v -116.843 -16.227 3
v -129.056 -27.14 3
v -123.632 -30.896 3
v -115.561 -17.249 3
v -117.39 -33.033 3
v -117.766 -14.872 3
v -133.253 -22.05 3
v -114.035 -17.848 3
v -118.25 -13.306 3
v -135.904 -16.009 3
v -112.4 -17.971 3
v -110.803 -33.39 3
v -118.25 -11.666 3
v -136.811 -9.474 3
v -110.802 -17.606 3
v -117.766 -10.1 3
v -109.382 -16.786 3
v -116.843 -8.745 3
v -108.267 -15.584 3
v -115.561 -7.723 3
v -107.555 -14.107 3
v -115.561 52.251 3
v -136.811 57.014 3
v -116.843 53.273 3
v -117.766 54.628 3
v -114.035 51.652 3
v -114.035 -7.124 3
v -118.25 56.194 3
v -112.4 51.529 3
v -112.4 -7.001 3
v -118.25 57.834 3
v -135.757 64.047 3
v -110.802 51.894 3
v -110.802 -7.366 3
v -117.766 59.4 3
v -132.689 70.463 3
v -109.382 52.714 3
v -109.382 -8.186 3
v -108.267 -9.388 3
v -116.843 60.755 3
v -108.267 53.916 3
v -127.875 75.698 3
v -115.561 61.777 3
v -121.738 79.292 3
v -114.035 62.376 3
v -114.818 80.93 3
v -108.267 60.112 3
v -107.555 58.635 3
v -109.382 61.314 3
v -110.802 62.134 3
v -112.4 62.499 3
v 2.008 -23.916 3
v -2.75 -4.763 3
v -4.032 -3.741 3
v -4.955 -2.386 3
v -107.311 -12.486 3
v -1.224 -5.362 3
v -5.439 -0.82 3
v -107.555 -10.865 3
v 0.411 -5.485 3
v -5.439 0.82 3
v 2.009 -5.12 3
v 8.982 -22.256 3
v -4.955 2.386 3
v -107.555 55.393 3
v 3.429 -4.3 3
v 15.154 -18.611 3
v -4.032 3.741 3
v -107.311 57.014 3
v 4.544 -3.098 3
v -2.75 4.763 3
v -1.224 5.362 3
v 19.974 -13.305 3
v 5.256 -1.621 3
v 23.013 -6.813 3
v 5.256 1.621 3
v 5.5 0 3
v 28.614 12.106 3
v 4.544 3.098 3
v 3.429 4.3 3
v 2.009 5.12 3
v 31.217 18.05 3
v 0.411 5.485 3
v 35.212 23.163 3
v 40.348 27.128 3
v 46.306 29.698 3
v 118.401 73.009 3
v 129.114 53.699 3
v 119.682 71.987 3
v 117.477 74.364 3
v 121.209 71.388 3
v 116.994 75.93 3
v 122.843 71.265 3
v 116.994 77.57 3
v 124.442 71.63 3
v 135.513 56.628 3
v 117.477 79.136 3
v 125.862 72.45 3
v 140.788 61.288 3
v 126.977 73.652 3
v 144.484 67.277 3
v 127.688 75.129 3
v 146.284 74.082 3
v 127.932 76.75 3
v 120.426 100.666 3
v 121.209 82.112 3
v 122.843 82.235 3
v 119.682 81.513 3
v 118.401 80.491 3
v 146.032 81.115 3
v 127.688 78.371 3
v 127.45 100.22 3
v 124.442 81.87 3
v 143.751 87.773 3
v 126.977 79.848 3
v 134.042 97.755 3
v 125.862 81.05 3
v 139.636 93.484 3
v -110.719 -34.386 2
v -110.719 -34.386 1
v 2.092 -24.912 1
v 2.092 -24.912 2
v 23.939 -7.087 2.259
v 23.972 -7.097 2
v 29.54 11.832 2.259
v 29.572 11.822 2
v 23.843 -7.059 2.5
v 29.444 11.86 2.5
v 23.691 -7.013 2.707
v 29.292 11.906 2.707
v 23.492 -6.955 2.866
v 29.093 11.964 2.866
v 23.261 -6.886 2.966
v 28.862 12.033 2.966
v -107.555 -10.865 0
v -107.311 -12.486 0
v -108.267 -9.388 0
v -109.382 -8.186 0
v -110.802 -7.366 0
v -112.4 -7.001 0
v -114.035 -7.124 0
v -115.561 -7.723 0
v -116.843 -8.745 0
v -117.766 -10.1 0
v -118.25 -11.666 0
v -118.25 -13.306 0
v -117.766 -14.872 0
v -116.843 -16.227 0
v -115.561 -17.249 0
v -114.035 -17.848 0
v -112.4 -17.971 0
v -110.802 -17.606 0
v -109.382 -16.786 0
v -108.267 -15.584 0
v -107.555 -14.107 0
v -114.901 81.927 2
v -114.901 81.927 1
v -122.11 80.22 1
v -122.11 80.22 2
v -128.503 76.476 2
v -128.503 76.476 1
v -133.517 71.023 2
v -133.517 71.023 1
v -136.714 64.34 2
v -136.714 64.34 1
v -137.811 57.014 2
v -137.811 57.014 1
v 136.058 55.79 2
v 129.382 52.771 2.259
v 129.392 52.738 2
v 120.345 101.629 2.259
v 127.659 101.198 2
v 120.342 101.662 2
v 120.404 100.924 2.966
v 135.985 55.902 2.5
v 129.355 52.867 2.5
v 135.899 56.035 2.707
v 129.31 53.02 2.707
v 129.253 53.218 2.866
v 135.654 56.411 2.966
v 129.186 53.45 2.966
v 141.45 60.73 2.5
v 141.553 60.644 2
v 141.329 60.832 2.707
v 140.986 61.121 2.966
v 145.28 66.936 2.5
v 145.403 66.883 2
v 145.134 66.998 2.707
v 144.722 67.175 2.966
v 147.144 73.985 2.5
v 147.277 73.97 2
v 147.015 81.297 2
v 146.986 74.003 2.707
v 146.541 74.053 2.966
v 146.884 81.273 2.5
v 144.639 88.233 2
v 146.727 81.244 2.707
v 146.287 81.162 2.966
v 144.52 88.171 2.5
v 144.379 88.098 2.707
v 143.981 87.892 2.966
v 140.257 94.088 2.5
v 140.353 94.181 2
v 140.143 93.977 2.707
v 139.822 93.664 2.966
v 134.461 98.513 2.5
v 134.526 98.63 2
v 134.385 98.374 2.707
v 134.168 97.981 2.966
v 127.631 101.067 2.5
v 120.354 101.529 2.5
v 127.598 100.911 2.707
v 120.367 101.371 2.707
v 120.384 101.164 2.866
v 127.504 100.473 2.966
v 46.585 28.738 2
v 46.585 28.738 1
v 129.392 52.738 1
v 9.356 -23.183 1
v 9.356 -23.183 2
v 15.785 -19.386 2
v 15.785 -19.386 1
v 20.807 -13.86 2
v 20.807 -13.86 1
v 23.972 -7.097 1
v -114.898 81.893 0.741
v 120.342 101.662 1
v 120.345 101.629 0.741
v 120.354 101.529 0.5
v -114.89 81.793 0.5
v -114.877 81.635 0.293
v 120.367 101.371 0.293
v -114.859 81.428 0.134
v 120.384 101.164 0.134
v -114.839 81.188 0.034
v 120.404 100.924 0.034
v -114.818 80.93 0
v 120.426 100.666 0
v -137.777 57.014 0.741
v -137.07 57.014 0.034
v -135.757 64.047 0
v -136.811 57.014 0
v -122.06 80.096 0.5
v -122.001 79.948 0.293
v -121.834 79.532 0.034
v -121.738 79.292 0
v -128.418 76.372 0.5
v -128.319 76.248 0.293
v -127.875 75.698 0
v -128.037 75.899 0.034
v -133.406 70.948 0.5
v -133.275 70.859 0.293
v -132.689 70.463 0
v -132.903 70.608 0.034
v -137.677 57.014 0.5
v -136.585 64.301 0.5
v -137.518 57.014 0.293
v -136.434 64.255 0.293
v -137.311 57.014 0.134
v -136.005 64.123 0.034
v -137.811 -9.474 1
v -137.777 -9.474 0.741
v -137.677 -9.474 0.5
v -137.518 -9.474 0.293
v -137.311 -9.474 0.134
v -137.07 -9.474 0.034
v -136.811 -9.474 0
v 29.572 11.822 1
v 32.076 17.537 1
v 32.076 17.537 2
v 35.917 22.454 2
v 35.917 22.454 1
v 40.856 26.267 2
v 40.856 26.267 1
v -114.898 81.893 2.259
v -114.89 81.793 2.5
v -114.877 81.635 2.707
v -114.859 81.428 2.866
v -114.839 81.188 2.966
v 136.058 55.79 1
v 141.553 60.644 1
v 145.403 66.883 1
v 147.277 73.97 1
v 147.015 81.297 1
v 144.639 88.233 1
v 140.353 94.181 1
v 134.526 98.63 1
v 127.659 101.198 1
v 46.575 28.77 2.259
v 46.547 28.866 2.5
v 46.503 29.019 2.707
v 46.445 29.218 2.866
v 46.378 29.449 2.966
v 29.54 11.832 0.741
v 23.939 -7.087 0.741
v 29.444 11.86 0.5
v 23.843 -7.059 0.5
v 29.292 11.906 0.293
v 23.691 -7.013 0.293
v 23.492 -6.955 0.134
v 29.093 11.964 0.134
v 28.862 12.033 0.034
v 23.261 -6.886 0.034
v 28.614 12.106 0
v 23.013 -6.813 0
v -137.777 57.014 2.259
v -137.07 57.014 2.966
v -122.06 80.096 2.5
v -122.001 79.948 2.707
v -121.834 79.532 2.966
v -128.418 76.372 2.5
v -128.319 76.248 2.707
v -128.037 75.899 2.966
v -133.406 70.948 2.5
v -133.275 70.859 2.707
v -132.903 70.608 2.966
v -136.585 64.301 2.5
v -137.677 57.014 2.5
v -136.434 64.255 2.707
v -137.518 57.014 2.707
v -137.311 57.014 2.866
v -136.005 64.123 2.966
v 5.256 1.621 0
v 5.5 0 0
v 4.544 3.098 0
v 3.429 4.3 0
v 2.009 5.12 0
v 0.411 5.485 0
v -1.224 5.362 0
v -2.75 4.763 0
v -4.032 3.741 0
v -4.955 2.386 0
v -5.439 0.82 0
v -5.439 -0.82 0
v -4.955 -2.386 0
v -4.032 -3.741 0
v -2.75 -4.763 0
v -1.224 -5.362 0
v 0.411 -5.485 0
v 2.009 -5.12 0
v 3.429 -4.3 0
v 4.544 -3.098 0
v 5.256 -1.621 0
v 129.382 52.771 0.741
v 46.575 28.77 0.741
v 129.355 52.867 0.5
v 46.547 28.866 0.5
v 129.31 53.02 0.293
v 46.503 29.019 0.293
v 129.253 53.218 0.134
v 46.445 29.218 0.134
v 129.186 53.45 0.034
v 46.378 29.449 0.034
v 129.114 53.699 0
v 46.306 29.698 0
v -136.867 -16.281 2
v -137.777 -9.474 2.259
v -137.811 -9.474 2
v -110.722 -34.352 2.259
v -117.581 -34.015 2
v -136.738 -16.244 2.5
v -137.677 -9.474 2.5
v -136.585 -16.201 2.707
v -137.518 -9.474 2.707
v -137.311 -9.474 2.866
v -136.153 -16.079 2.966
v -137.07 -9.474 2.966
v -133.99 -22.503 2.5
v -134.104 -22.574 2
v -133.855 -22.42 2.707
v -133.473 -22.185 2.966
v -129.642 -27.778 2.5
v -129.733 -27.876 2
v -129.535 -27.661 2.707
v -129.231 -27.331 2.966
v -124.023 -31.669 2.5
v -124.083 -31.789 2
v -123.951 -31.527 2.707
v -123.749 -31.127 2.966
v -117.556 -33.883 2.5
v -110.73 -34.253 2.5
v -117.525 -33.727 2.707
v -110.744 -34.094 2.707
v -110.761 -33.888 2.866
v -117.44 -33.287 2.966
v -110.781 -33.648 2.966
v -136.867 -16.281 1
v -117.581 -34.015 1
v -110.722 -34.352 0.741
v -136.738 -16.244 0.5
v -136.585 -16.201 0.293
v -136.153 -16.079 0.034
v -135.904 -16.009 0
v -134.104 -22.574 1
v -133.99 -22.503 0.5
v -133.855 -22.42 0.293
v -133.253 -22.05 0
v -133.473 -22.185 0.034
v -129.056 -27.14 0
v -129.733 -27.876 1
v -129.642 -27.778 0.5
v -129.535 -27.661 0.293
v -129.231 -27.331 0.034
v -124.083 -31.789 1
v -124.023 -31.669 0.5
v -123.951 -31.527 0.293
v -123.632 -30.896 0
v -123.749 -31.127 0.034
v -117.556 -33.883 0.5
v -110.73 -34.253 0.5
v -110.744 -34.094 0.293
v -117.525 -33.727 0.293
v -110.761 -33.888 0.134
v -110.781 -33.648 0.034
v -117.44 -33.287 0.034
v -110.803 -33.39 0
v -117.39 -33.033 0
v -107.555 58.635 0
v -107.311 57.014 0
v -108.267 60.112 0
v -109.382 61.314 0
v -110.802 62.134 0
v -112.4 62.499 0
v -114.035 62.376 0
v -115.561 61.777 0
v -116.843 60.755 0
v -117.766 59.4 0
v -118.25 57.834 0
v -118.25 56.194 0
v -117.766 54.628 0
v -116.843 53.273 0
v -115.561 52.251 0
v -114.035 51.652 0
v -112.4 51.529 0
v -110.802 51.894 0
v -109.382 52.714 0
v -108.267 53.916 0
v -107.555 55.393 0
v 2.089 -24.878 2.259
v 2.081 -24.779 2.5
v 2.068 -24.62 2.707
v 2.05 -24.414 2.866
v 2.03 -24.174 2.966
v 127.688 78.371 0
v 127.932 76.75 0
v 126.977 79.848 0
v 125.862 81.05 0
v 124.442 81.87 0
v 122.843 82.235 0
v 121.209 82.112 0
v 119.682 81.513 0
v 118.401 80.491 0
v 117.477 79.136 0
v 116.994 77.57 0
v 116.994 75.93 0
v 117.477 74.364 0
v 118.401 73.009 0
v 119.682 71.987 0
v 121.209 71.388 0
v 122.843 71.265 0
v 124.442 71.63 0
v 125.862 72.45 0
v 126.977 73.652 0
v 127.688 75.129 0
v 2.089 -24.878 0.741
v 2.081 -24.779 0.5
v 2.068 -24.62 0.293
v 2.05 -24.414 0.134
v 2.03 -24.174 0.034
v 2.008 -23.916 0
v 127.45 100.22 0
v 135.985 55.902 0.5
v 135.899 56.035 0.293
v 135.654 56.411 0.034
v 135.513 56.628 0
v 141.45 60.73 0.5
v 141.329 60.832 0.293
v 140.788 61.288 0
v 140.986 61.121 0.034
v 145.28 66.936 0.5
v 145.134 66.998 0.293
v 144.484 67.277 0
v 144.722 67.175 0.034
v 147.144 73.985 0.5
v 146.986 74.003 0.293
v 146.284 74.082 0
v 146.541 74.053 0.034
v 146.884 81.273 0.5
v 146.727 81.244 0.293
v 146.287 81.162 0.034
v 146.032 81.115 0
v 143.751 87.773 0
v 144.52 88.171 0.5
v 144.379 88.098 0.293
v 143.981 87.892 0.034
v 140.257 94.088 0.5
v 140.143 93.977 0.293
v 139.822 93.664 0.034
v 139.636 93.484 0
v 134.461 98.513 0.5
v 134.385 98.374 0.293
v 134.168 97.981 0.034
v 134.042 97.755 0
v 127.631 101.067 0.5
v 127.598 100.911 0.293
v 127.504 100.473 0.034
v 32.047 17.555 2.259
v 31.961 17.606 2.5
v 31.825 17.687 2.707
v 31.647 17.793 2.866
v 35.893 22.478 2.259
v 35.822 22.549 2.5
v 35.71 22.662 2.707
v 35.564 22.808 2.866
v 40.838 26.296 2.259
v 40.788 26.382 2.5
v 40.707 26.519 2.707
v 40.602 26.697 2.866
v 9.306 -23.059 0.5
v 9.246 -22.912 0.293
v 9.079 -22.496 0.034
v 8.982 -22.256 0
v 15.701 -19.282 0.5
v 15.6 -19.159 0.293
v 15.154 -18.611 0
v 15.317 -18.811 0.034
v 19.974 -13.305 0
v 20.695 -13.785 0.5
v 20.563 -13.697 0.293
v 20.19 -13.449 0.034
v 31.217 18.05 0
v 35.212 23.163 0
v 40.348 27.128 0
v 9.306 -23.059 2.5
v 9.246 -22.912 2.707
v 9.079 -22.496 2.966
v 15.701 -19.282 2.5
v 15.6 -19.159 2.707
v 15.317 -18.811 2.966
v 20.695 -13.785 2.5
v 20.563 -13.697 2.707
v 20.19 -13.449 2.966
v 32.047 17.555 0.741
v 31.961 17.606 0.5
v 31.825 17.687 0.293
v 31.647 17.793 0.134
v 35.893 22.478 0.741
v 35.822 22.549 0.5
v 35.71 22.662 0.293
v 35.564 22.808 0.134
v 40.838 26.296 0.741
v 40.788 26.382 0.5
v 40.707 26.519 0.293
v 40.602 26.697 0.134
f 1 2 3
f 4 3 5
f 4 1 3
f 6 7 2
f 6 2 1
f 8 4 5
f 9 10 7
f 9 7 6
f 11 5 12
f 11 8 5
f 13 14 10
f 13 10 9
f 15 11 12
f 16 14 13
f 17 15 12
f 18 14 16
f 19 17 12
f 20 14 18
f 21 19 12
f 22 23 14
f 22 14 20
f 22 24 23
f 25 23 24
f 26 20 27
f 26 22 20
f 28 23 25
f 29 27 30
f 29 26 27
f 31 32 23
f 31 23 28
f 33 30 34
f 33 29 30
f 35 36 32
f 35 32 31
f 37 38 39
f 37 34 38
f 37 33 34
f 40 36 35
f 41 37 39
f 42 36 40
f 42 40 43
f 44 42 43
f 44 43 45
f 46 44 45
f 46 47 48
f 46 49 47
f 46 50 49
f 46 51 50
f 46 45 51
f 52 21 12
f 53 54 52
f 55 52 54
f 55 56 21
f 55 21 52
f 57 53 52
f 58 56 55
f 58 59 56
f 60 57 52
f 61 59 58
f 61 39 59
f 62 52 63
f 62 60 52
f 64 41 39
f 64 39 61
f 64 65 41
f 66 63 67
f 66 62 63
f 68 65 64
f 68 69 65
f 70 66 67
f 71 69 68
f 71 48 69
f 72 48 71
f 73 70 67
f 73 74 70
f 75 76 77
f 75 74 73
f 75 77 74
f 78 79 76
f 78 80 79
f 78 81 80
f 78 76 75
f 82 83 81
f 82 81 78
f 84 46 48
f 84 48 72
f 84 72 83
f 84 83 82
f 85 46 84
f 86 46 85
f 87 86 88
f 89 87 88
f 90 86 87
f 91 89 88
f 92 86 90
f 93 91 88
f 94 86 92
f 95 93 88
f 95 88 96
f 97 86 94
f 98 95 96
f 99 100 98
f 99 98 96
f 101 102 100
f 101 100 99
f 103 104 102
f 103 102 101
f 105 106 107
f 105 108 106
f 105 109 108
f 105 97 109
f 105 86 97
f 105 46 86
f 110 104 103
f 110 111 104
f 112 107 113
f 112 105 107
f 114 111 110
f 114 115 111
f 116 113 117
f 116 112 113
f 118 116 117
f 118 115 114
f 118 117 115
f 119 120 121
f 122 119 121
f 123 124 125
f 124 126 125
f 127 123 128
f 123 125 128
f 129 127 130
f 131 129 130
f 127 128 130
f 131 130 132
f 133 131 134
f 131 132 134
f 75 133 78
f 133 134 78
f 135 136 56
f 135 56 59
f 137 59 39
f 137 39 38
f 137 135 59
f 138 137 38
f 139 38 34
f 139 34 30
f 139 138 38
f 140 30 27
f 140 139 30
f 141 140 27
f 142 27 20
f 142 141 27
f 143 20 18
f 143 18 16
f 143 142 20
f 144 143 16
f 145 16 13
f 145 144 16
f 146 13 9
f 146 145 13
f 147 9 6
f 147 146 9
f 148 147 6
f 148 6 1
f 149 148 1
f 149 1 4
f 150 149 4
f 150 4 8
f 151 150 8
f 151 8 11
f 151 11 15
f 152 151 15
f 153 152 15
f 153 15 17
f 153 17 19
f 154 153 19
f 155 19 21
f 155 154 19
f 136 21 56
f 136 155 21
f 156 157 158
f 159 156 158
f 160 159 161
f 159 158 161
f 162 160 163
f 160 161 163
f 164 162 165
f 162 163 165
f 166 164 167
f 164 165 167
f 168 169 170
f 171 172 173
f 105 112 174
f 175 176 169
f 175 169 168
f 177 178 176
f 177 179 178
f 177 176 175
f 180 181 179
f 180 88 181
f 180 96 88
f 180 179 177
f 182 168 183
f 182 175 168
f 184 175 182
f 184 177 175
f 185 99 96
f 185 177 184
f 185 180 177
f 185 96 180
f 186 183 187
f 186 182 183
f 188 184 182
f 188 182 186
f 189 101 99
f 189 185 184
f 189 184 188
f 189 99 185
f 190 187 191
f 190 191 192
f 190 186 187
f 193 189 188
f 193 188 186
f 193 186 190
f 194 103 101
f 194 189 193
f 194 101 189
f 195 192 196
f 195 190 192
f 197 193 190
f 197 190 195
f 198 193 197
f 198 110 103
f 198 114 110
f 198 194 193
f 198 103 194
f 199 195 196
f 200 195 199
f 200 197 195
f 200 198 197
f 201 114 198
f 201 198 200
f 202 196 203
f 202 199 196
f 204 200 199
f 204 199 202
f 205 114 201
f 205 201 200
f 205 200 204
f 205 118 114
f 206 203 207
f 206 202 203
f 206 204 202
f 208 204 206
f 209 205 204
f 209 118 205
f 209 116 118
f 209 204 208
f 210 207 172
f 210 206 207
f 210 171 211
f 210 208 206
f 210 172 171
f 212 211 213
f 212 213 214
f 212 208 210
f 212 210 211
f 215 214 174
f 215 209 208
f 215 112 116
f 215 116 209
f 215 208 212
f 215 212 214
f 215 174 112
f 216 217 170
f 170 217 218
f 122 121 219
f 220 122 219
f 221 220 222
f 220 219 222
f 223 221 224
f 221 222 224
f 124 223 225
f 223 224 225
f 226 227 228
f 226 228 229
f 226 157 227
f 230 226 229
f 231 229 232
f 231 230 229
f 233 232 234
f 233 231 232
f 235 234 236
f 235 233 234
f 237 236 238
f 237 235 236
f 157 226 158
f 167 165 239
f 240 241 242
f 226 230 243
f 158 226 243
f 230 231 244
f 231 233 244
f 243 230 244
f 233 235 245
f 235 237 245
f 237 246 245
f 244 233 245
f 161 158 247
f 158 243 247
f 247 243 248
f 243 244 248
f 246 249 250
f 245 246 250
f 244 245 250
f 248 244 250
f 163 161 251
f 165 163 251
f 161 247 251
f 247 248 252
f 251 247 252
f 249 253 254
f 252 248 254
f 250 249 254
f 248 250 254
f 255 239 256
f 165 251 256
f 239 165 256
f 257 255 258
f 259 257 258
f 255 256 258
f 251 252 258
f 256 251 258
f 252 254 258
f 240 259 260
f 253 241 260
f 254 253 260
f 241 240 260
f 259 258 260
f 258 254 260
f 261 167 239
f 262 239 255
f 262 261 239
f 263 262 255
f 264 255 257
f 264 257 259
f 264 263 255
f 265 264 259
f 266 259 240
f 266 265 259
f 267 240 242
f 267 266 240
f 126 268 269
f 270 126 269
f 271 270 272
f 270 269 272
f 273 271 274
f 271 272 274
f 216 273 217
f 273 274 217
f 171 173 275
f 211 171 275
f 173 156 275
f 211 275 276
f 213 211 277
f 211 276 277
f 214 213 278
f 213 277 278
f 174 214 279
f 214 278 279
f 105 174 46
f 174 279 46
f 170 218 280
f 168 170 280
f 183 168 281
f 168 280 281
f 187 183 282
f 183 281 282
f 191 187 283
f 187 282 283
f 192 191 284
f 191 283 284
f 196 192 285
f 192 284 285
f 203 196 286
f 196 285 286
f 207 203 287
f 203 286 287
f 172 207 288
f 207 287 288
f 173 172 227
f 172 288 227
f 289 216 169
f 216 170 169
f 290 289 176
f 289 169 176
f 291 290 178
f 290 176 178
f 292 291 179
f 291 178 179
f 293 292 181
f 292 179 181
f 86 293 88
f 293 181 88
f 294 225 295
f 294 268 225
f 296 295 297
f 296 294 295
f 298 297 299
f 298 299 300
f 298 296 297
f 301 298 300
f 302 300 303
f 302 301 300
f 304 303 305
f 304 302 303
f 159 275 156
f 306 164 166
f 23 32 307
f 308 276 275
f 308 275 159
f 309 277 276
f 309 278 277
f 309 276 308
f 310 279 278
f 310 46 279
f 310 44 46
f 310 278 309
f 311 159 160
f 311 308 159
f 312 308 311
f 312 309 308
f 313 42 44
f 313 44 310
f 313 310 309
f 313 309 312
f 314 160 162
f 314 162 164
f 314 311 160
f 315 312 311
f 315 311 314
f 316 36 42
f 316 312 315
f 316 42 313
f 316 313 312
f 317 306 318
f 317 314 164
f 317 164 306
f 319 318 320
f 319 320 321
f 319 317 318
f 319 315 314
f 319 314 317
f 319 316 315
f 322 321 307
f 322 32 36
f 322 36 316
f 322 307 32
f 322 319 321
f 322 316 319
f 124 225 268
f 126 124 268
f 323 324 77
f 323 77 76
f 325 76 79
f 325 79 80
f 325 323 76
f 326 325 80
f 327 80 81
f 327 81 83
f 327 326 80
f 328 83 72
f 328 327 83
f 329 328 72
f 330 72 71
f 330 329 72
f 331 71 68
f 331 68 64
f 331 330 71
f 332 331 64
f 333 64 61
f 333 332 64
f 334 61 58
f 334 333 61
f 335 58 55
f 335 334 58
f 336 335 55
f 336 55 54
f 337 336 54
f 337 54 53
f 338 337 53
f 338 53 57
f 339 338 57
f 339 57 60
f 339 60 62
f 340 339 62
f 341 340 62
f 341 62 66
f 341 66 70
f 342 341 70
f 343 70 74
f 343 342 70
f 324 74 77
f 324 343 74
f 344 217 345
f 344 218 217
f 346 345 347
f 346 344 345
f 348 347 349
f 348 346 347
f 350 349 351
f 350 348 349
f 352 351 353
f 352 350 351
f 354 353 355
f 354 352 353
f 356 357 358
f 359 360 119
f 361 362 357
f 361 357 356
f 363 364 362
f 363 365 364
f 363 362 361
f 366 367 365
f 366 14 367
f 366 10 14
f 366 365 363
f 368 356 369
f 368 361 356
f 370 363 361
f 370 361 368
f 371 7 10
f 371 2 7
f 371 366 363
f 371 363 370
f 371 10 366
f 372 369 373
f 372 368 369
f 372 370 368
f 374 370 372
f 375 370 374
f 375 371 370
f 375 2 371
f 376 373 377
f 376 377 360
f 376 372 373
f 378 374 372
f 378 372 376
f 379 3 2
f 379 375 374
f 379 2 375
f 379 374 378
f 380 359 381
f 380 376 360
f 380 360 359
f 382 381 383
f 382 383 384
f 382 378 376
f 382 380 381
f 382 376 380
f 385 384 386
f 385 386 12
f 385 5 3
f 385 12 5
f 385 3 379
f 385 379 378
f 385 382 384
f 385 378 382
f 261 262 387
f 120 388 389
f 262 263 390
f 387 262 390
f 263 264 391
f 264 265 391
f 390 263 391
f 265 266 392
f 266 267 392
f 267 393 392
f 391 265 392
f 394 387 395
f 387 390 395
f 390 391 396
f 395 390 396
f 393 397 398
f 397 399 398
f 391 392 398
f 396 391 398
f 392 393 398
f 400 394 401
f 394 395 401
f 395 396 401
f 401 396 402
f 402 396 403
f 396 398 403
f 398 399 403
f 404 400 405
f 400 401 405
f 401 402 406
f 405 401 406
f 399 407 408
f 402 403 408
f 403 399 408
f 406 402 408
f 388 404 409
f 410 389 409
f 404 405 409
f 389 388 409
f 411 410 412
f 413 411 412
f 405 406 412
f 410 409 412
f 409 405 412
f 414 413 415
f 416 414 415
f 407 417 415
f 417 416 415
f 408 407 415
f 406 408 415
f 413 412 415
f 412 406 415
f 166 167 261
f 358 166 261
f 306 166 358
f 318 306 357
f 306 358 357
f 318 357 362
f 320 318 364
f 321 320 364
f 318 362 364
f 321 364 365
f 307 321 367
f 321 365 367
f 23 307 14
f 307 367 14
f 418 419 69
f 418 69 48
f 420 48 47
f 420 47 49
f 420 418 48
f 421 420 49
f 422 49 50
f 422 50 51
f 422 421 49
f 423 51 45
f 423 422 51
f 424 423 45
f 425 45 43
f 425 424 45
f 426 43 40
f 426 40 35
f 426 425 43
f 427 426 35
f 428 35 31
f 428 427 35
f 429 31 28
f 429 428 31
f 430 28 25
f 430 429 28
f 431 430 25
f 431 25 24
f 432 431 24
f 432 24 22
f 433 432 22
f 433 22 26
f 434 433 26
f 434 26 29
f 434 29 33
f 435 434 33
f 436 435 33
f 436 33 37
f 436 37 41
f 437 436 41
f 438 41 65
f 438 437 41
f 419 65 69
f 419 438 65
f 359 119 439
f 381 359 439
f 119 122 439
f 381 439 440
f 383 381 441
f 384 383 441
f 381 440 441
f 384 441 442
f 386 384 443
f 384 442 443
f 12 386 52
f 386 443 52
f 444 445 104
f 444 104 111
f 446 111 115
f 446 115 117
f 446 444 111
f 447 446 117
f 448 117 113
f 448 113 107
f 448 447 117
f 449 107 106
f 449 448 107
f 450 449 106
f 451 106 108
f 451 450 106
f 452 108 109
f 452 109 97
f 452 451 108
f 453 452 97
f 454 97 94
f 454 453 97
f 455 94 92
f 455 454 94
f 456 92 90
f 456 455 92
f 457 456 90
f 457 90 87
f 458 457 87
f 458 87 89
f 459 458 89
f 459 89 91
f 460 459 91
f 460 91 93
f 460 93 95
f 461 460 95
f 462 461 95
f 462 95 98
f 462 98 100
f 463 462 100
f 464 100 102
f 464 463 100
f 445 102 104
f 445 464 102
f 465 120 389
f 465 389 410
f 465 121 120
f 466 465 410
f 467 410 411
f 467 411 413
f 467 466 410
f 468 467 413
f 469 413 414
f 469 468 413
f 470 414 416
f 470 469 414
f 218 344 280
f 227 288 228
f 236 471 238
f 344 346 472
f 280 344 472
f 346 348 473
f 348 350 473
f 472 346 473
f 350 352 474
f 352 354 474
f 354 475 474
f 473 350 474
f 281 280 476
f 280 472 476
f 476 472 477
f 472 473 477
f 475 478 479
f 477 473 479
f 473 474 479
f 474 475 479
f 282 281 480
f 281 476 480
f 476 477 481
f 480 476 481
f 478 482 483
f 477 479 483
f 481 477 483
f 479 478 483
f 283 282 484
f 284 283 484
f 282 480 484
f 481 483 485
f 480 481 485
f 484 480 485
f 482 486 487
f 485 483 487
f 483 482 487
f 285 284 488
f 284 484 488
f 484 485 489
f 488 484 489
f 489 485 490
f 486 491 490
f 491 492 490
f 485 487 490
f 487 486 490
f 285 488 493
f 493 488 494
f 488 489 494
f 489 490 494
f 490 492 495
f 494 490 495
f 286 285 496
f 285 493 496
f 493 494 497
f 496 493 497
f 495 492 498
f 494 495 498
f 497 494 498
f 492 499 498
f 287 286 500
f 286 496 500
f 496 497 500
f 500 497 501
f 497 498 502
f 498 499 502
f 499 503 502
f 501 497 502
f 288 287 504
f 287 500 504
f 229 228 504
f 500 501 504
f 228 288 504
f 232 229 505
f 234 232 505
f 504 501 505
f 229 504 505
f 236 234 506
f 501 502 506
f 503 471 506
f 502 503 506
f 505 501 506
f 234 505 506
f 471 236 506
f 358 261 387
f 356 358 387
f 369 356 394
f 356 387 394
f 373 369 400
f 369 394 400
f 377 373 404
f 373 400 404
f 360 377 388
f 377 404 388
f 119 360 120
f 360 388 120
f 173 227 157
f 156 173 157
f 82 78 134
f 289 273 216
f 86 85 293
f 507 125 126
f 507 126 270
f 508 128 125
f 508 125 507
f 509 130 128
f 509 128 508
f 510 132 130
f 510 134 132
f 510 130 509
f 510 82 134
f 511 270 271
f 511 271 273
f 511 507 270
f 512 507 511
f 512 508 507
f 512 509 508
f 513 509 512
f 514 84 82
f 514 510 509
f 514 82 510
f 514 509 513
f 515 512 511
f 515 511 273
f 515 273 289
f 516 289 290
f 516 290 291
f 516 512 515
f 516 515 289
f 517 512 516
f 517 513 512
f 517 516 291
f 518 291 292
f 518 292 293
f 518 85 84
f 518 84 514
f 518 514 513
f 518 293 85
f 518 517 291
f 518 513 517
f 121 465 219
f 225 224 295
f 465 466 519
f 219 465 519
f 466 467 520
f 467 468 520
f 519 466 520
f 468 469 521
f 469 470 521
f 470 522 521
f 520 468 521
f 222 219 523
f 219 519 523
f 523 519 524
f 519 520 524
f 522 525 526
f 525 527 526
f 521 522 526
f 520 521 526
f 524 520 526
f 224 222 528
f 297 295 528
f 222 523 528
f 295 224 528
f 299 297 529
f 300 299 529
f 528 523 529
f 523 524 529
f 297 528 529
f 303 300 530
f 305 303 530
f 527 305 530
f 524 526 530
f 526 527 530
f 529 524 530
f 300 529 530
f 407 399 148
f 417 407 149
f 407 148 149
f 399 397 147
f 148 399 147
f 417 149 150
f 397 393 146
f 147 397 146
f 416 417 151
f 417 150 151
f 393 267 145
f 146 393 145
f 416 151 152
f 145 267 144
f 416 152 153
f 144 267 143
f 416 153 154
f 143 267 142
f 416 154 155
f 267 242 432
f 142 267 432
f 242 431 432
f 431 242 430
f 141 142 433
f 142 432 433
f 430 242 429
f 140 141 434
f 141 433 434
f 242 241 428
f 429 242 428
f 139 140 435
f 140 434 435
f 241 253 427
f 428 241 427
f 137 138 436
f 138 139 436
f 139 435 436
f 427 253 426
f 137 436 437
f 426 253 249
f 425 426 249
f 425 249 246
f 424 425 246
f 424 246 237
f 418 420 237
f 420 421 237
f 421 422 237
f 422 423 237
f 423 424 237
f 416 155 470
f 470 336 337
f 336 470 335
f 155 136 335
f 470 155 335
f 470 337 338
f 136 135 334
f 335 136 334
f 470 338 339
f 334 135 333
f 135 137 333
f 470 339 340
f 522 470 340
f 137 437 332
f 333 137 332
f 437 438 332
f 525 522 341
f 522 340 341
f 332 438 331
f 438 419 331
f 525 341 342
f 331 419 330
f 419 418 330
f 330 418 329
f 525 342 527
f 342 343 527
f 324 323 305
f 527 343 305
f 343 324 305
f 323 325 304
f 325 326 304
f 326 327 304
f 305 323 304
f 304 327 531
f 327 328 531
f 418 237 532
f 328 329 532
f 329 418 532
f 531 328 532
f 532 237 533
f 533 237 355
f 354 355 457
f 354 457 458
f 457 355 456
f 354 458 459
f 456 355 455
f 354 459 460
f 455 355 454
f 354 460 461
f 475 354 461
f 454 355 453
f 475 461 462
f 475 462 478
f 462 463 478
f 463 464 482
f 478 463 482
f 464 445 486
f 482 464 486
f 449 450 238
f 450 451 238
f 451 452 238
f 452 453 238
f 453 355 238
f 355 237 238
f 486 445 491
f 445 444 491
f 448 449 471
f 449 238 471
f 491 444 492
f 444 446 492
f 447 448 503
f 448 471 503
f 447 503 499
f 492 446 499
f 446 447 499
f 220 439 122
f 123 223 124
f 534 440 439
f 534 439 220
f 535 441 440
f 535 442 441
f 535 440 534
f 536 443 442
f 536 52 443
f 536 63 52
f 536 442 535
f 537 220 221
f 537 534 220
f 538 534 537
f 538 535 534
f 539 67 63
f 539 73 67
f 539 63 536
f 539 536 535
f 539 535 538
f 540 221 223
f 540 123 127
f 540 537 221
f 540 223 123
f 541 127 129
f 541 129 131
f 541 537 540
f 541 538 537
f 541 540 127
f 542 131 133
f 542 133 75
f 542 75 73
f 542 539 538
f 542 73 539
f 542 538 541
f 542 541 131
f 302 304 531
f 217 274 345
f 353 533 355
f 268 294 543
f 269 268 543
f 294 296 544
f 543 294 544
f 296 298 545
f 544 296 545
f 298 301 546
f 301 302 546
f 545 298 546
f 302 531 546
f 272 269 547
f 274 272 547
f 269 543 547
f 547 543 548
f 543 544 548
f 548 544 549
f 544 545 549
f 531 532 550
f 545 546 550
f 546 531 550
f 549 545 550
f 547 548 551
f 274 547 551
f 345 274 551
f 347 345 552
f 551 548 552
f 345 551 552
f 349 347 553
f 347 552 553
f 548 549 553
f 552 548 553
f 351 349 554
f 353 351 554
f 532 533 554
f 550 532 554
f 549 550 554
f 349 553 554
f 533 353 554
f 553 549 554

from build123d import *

# Parameters (mm, degrees)
F0_R     = 5.5
F1_DEPTH = 3
F2_R     = 1


# Not quite as in the source:
# - a feature names something its author has since deleted; it is built from what else it names


with BuildPart() as f1:
    # F0 (on Top) → F1 (new body)
    with BuildSketch(Plane.XY):
        with BuildLine():
            ThreePointArc((-114.9011806829, 81.9265817605), (-131.2129171427, 73.936702076), (-137.8111356168, 57.0141007194))
            Line((-137.8111356168, 57.0141007194), (-137.8111356168, -9.4738897749))
            ThreePointArc((-137.8111356168, -9.4738897749), (-129.7329640684, -27.8763820478), (-110.7189978684, -34.3861951608))
            Line((-110.7189978684, -34.3861951608), (2.0921377484, -24.9123053859))
            ThreePointArc((2.0921377484, -24.9123053859), (15.7854299835, -19.3860826429), (23.9716178382, -7.0965863779))
            Line((23.9716178382, -7.0965863779), (29.5724079217, 11.8223687823))
            ThreePointArc((29.5724079217, 11.8223687823), (35.9169319793, 22.4538833983), (46.5845244365, 28.7375574602))
            Line((46.5845244365, 28.7375574602), (129.3918966116, 52.7381994328))
            ThreePointArc((129.3918966116, 52.7381994328), (147.0153896078, 81.2971043835), (120.3423502221, 101.6624555296))
            Line((120.3423502221, 101.6624555296), (-114.9011806829, 81.9265817605))
        make_face()
        with Locations((-112.8111356168, -12.4858992806)):
            Circle(F0_R, mode=Mode.SUBTRACT)
        Circle(F0_R, mode=Mode.SUBTRACT)
        with Locations((-112.8111356168, 57.0141007194)):
            Circle(F0_R, mode=Mode.SUBTRACT)
        with Locations((122.4323952882, 76.7499744885)):
            Circle(F0_R, mode=Mode.SUBTRACT)
    extrude(amount=F1_DEPTH)

    # F2
    f2_edges = [f1.edges().sort_by_distance(p)[0] for p in [
        (2.720585, 91.794519, 0),
        (147.01539, 81.297104, 0),
        (87.988211, 40.737878, 0),
        (-137.811136, 23.770105, 0),
        (-137.811136, 23.770105, 3),
        (-131.212917, 73.936702, 0),
        (-131.212917, 73.936702, 3),
        (2.720585, 91.794519, 3),
        (147.01539, 81.297104, 3),
        (87.988211, 40.737878, 3),
    ]]
    fillet(f2_edges, radius=F2_R)


solid = f1.part
